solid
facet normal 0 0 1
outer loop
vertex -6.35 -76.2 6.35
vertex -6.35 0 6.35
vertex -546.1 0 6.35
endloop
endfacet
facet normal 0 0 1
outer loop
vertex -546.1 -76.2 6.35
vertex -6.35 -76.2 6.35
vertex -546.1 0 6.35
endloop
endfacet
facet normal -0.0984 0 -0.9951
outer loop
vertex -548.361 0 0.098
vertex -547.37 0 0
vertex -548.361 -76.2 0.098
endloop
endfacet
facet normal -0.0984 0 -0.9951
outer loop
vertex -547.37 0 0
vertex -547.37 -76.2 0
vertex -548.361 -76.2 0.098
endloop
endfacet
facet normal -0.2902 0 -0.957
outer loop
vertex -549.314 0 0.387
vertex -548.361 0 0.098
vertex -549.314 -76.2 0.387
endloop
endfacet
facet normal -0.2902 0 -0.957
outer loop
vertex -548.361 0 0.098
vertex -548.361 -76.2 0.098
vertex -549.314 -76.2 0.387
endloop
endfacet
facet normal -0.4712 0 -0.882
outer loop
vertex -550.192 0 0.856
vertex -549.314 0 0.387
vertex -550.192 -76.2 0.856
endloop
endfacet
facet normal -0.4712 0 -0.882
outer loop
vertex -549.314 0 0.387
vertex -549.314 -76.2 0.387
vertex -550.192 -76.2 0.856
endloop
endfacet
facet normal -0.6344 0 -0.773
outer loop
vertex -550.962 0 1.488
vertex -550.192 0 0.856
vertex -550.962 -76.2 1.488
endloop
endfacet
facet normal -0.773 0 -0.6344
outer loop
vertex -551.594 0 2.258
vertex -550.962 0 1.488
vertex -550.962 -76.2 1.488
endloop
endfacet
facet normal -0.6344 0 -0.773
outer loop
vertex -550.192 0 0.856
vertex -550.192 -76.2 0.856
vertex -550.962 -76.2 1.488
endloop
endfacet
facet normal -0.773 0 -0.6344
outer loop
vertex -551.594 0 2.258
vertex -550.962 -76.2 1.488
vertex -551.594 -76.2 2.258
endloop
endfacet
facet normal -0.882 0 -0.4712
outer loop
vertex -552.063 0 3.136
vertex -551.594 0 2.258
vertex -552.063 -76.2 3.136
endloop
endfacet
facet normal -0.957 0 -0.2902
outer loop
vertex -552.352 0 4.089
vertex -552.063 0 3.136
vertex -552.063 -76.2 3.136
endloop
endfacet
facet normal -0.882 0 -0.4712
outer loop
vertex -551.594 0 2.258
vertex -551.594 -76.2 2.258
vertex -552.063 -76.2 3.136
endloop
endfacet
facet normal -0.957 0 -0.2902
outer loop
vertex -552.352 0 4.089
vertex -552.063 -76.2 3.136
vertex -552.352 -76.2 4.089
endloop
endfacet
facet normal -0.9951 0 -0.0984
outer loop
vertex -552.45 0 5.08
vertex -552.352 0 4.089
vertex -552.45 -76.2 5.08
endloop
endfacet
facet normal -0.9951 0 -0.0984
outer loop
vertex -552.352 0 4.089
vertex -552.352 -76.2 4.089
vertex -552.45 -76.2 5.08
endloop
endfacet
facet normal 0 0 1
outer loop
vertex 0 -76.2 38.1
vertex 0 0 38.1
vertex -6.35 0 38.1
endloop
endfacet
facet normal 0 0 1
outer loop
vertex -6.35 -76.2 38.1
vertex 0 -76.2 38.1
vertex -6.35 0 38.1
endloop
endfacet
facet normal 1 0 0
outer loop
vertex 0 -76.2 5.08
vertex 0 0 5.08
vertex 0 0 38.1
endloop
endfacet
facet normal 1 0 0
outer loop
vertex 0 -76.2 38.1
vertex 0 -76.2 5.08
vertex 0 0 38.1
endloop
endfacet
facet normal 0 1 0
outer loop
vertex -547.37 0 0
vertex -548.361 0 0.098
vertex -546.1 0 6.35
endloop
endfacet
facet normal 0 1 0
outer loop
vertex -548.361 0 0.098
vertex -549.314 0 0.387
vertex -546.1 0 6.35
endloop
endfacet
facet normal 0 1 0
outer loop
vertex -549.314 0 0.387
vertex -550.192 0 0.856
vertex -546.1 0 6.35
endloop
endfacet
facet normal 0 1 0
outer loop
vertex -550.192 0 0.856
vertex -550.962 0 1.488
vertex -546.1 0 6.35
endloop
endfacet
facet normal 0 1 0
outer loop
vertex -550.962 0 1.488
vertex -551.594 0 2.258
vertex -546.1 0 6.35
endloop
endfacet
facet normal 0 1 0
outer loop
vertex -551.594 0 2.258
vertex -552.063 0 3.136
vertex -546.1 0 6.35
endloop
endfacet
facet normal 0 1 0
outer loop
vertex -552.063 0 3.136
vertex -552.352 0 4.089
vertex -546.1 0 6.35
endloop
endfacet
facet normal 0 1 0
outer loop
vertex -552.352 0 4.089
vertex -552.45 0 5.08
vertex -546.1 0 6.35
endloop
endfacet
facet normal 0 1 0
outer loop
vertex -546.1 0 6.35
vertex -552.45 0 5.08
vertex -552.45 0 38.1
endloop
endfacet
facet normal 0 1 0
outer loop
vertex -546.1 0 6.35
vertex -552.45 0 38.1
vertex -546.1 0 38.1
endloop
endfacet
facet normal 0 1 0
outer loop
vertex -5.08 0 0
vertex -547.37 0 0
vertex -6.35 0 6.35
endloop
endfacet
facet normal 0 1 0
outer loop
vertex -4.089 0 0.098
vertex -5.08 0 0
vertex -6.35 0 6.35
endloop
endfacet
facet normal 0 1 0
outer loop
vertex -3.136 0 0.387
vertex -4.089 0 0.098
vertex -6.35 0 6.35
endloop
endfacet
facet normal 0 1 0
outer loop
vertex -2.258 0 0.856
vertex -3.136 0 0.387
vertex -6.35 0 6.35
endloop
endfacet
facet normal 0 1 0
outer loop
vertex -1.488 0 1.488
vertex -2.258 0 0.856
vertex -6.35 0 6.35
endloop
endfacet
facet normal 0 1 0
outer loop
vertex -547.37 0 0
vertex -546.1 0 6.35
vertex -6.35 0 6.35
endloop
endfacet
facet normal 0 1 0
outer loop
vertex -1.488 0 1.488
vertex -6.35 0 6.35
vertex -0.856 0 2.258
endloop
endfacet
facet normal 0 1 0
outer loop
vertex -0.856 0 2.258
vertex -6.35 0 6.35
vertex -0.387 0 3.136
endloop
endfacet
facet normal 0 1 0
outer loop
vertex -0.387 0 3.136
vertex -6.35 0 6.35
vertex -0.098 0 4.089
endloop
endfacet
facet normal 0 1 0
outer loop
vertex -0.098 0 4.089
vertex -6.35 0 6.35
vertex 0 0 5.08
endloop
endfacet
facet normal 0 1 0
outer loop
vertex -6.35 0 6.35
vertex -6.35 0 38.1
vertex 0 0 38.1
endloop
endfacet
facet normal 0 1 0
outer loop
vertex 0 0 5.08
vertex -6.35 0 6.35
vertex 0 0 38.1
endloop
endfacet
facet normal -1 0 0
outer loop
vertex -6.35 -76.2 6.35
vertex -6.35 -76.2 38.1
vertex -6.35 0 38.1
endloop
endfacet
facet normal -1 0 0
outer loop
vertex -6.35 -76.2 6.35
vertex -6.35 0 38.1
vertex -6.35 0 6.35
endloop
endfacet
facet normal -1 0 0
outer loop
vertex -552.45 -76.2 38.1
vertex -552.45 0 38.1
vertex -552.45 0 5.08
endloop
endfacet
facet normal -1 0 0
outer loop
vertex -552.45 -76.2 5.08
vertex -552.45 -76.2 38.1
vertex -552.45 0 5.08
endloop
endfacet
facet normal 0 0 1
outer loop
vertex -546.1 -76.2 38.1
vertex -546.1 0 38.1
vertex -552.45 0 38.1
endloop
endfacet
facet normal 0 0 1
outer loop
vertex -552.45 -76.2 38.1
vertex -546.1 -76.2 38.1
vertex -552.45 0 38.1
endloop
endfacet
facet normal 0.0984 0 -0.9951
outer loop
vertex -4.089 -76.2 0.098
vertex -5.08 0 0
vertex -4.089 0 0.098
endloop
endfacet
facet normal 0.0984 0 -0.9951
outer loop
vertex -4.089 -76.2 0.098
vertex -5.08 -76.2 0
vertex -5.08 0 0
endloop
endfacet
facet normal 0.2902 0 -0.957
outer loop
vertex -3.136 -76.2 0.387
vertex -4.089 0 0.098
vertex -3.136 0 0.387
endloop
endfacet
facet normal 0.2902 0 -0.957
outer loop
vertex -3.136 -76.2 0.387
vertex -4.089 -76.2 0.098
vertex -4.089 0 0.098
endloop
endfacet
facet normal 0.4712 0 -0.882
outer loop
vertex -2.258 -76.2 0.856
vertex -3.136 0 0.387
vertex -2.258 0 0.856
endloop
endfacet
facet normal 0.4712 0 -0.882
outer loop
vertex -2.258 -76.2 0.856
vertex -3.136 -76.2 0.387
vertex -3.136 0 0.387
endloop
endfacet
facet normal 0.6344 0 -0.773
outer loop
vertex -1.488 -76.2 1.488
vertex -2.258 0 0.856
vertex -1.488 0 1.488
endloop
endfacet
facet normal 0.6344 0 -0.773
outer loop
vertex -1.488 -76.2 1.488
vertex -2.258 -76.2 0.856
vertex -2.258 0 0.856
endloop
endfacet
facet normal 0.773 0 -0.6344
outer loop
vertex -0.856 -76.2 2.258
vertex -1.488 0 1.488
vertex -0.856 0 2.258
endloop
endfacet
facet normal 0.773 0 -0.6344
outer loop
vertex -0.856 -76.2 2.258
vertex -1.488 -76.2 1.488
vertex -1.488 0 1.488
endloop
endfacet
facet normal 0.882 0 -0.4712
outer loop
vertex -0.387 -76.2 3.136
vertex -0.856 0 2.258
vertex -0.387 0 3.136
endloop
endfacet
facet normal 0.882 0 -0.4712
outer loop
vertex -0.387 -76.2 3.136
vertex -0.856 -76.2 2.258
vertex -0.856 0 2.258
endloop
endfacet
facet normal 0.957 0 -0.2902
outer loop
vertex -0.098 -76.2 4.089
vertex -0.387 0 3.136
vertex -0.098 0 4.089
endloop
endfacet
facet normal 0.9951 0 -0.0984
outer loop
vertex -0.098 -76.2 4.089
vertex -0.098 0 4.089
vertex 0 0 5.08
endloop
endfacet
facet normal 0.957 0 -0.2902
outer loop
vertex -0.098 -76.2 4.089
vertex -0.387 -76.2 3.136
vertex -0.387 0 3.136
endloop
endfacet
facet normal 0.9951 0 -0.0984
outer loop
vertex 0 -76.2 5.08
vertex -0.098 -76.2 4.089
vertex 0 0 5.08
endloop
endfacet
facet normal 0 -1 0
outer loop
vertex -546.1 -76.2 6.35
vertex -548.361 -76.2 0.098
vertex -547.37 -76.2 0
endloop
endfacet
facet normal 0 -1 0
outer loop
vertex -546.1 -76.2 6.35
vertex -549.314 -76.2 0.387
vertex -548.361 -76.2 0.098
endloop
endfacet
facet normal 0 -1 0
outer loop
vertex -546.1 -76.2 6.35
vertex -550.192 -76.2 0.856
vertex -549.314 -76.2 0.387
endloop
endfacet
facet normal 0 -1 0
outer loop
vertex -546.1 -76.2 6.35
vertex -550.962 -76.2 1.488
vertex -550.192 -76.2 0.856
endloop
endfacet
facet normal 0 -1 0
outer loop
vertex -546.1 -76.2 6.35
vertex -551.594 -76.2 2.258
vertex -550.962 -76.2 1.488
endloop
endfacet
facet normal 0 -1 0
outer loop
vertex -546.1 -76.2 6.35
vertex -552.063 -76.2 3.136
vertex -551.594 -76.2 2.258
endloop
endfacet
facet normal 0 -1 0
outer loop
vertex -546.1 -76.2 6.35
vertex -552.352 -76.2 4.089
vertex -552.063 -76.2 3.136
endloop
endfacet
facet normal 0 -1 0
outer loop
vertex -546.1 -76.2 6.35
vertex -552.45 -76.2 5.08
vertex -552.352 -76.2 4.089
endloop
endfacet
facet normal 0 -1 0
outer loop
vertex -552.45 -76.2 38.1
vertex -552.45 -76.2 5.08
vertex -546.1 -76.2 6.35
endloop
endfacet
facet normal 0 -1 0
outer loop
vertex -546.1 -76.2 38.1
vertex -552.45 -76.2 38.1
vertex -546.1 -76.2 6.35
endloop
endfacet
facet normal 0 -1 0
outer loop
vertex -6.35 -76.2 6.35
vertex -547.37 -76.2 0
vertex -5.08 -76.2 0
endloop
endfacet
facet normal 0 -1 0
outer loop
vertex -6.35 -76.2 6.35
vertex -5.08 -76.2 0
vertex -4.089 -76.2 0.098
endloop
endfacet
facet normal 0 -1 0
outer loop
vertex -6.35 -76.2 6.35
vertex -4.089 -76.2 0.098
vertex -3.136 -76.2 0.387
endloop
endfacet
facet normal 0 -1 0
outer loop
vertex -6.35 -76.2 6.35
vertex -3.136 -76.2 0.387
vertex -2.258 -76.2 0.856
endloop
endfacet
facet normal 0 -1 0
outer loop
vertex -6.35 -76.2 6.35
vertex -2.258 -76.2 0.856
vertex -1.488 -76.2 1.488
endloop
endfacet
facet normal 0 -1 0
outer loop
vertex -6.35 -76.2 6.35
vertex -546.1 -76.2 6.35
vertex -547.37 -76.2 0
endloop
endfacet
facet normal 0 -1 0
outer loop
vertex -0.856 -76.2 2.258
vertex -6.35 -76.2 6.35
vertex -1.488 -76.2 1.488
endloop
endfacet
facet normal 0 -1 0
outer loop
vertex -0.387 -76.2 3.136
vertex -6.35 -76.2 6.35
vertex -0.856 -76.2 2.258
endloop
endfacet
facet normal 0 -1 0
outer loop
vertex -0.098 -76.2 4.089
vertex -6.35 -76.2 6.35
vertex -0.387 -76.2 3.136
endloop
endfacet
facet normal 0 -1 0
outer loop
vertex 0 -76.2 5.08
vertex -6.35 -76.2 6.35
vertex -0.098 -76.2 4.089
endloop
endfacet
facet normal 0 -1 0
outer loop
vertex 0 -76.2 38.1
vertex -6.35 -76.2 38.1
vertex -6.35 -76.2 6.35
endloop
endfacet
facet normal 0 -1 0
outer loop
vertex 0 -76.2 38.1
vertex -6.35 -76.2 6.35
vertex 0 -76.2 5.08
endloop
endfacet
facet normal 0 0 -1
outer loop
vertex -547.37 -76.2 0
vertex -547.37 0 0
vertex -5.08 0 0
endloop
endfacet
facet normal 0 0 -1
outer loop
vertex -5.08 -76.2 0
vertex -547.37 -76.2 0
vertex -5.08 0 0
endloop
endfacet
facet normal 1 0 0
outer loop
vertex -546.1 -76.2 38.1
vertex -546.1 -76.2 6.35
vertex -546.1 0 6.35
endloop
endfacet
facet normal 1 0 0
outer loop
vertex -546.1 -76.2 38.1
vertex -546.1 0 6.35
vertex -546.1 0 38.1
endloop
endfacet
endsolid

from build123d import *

# Parameters (mm, degrees)
F1_DEPTH = 76.2
F2_R     = 5.08
F3_R     = 5.08


with BuildPart() as f1:
    # F0 (on Front) → F1 (new body)
    with BuildSketch(Plane.XZ):
        Polygon((-552.45, 0), (0, 0), (0, 38.1), (-6.35, 38.1), (-6.35, 6.35), (-546.1, 6.35), (-546.1, 38.1), (-552.45, 38.1), (-552.45, 6.35), align=None)
    extrude(amount=F1_DEPTH)

    # F2
    f2_edges = [f1.edges().sort_by_distance(p)[0] for p in [
        (-552.45, -38.1, 0),
    ]]
    fillet(f2_edges, radius=F2_R)

    # F3
    f3_edges = [f1.edges().sort_by_distance(p)[0] for p in [
        (0, -38.1, 0),
    ]]
    fillet(f3_edges, radius=F3_R)


solid = f1.part
